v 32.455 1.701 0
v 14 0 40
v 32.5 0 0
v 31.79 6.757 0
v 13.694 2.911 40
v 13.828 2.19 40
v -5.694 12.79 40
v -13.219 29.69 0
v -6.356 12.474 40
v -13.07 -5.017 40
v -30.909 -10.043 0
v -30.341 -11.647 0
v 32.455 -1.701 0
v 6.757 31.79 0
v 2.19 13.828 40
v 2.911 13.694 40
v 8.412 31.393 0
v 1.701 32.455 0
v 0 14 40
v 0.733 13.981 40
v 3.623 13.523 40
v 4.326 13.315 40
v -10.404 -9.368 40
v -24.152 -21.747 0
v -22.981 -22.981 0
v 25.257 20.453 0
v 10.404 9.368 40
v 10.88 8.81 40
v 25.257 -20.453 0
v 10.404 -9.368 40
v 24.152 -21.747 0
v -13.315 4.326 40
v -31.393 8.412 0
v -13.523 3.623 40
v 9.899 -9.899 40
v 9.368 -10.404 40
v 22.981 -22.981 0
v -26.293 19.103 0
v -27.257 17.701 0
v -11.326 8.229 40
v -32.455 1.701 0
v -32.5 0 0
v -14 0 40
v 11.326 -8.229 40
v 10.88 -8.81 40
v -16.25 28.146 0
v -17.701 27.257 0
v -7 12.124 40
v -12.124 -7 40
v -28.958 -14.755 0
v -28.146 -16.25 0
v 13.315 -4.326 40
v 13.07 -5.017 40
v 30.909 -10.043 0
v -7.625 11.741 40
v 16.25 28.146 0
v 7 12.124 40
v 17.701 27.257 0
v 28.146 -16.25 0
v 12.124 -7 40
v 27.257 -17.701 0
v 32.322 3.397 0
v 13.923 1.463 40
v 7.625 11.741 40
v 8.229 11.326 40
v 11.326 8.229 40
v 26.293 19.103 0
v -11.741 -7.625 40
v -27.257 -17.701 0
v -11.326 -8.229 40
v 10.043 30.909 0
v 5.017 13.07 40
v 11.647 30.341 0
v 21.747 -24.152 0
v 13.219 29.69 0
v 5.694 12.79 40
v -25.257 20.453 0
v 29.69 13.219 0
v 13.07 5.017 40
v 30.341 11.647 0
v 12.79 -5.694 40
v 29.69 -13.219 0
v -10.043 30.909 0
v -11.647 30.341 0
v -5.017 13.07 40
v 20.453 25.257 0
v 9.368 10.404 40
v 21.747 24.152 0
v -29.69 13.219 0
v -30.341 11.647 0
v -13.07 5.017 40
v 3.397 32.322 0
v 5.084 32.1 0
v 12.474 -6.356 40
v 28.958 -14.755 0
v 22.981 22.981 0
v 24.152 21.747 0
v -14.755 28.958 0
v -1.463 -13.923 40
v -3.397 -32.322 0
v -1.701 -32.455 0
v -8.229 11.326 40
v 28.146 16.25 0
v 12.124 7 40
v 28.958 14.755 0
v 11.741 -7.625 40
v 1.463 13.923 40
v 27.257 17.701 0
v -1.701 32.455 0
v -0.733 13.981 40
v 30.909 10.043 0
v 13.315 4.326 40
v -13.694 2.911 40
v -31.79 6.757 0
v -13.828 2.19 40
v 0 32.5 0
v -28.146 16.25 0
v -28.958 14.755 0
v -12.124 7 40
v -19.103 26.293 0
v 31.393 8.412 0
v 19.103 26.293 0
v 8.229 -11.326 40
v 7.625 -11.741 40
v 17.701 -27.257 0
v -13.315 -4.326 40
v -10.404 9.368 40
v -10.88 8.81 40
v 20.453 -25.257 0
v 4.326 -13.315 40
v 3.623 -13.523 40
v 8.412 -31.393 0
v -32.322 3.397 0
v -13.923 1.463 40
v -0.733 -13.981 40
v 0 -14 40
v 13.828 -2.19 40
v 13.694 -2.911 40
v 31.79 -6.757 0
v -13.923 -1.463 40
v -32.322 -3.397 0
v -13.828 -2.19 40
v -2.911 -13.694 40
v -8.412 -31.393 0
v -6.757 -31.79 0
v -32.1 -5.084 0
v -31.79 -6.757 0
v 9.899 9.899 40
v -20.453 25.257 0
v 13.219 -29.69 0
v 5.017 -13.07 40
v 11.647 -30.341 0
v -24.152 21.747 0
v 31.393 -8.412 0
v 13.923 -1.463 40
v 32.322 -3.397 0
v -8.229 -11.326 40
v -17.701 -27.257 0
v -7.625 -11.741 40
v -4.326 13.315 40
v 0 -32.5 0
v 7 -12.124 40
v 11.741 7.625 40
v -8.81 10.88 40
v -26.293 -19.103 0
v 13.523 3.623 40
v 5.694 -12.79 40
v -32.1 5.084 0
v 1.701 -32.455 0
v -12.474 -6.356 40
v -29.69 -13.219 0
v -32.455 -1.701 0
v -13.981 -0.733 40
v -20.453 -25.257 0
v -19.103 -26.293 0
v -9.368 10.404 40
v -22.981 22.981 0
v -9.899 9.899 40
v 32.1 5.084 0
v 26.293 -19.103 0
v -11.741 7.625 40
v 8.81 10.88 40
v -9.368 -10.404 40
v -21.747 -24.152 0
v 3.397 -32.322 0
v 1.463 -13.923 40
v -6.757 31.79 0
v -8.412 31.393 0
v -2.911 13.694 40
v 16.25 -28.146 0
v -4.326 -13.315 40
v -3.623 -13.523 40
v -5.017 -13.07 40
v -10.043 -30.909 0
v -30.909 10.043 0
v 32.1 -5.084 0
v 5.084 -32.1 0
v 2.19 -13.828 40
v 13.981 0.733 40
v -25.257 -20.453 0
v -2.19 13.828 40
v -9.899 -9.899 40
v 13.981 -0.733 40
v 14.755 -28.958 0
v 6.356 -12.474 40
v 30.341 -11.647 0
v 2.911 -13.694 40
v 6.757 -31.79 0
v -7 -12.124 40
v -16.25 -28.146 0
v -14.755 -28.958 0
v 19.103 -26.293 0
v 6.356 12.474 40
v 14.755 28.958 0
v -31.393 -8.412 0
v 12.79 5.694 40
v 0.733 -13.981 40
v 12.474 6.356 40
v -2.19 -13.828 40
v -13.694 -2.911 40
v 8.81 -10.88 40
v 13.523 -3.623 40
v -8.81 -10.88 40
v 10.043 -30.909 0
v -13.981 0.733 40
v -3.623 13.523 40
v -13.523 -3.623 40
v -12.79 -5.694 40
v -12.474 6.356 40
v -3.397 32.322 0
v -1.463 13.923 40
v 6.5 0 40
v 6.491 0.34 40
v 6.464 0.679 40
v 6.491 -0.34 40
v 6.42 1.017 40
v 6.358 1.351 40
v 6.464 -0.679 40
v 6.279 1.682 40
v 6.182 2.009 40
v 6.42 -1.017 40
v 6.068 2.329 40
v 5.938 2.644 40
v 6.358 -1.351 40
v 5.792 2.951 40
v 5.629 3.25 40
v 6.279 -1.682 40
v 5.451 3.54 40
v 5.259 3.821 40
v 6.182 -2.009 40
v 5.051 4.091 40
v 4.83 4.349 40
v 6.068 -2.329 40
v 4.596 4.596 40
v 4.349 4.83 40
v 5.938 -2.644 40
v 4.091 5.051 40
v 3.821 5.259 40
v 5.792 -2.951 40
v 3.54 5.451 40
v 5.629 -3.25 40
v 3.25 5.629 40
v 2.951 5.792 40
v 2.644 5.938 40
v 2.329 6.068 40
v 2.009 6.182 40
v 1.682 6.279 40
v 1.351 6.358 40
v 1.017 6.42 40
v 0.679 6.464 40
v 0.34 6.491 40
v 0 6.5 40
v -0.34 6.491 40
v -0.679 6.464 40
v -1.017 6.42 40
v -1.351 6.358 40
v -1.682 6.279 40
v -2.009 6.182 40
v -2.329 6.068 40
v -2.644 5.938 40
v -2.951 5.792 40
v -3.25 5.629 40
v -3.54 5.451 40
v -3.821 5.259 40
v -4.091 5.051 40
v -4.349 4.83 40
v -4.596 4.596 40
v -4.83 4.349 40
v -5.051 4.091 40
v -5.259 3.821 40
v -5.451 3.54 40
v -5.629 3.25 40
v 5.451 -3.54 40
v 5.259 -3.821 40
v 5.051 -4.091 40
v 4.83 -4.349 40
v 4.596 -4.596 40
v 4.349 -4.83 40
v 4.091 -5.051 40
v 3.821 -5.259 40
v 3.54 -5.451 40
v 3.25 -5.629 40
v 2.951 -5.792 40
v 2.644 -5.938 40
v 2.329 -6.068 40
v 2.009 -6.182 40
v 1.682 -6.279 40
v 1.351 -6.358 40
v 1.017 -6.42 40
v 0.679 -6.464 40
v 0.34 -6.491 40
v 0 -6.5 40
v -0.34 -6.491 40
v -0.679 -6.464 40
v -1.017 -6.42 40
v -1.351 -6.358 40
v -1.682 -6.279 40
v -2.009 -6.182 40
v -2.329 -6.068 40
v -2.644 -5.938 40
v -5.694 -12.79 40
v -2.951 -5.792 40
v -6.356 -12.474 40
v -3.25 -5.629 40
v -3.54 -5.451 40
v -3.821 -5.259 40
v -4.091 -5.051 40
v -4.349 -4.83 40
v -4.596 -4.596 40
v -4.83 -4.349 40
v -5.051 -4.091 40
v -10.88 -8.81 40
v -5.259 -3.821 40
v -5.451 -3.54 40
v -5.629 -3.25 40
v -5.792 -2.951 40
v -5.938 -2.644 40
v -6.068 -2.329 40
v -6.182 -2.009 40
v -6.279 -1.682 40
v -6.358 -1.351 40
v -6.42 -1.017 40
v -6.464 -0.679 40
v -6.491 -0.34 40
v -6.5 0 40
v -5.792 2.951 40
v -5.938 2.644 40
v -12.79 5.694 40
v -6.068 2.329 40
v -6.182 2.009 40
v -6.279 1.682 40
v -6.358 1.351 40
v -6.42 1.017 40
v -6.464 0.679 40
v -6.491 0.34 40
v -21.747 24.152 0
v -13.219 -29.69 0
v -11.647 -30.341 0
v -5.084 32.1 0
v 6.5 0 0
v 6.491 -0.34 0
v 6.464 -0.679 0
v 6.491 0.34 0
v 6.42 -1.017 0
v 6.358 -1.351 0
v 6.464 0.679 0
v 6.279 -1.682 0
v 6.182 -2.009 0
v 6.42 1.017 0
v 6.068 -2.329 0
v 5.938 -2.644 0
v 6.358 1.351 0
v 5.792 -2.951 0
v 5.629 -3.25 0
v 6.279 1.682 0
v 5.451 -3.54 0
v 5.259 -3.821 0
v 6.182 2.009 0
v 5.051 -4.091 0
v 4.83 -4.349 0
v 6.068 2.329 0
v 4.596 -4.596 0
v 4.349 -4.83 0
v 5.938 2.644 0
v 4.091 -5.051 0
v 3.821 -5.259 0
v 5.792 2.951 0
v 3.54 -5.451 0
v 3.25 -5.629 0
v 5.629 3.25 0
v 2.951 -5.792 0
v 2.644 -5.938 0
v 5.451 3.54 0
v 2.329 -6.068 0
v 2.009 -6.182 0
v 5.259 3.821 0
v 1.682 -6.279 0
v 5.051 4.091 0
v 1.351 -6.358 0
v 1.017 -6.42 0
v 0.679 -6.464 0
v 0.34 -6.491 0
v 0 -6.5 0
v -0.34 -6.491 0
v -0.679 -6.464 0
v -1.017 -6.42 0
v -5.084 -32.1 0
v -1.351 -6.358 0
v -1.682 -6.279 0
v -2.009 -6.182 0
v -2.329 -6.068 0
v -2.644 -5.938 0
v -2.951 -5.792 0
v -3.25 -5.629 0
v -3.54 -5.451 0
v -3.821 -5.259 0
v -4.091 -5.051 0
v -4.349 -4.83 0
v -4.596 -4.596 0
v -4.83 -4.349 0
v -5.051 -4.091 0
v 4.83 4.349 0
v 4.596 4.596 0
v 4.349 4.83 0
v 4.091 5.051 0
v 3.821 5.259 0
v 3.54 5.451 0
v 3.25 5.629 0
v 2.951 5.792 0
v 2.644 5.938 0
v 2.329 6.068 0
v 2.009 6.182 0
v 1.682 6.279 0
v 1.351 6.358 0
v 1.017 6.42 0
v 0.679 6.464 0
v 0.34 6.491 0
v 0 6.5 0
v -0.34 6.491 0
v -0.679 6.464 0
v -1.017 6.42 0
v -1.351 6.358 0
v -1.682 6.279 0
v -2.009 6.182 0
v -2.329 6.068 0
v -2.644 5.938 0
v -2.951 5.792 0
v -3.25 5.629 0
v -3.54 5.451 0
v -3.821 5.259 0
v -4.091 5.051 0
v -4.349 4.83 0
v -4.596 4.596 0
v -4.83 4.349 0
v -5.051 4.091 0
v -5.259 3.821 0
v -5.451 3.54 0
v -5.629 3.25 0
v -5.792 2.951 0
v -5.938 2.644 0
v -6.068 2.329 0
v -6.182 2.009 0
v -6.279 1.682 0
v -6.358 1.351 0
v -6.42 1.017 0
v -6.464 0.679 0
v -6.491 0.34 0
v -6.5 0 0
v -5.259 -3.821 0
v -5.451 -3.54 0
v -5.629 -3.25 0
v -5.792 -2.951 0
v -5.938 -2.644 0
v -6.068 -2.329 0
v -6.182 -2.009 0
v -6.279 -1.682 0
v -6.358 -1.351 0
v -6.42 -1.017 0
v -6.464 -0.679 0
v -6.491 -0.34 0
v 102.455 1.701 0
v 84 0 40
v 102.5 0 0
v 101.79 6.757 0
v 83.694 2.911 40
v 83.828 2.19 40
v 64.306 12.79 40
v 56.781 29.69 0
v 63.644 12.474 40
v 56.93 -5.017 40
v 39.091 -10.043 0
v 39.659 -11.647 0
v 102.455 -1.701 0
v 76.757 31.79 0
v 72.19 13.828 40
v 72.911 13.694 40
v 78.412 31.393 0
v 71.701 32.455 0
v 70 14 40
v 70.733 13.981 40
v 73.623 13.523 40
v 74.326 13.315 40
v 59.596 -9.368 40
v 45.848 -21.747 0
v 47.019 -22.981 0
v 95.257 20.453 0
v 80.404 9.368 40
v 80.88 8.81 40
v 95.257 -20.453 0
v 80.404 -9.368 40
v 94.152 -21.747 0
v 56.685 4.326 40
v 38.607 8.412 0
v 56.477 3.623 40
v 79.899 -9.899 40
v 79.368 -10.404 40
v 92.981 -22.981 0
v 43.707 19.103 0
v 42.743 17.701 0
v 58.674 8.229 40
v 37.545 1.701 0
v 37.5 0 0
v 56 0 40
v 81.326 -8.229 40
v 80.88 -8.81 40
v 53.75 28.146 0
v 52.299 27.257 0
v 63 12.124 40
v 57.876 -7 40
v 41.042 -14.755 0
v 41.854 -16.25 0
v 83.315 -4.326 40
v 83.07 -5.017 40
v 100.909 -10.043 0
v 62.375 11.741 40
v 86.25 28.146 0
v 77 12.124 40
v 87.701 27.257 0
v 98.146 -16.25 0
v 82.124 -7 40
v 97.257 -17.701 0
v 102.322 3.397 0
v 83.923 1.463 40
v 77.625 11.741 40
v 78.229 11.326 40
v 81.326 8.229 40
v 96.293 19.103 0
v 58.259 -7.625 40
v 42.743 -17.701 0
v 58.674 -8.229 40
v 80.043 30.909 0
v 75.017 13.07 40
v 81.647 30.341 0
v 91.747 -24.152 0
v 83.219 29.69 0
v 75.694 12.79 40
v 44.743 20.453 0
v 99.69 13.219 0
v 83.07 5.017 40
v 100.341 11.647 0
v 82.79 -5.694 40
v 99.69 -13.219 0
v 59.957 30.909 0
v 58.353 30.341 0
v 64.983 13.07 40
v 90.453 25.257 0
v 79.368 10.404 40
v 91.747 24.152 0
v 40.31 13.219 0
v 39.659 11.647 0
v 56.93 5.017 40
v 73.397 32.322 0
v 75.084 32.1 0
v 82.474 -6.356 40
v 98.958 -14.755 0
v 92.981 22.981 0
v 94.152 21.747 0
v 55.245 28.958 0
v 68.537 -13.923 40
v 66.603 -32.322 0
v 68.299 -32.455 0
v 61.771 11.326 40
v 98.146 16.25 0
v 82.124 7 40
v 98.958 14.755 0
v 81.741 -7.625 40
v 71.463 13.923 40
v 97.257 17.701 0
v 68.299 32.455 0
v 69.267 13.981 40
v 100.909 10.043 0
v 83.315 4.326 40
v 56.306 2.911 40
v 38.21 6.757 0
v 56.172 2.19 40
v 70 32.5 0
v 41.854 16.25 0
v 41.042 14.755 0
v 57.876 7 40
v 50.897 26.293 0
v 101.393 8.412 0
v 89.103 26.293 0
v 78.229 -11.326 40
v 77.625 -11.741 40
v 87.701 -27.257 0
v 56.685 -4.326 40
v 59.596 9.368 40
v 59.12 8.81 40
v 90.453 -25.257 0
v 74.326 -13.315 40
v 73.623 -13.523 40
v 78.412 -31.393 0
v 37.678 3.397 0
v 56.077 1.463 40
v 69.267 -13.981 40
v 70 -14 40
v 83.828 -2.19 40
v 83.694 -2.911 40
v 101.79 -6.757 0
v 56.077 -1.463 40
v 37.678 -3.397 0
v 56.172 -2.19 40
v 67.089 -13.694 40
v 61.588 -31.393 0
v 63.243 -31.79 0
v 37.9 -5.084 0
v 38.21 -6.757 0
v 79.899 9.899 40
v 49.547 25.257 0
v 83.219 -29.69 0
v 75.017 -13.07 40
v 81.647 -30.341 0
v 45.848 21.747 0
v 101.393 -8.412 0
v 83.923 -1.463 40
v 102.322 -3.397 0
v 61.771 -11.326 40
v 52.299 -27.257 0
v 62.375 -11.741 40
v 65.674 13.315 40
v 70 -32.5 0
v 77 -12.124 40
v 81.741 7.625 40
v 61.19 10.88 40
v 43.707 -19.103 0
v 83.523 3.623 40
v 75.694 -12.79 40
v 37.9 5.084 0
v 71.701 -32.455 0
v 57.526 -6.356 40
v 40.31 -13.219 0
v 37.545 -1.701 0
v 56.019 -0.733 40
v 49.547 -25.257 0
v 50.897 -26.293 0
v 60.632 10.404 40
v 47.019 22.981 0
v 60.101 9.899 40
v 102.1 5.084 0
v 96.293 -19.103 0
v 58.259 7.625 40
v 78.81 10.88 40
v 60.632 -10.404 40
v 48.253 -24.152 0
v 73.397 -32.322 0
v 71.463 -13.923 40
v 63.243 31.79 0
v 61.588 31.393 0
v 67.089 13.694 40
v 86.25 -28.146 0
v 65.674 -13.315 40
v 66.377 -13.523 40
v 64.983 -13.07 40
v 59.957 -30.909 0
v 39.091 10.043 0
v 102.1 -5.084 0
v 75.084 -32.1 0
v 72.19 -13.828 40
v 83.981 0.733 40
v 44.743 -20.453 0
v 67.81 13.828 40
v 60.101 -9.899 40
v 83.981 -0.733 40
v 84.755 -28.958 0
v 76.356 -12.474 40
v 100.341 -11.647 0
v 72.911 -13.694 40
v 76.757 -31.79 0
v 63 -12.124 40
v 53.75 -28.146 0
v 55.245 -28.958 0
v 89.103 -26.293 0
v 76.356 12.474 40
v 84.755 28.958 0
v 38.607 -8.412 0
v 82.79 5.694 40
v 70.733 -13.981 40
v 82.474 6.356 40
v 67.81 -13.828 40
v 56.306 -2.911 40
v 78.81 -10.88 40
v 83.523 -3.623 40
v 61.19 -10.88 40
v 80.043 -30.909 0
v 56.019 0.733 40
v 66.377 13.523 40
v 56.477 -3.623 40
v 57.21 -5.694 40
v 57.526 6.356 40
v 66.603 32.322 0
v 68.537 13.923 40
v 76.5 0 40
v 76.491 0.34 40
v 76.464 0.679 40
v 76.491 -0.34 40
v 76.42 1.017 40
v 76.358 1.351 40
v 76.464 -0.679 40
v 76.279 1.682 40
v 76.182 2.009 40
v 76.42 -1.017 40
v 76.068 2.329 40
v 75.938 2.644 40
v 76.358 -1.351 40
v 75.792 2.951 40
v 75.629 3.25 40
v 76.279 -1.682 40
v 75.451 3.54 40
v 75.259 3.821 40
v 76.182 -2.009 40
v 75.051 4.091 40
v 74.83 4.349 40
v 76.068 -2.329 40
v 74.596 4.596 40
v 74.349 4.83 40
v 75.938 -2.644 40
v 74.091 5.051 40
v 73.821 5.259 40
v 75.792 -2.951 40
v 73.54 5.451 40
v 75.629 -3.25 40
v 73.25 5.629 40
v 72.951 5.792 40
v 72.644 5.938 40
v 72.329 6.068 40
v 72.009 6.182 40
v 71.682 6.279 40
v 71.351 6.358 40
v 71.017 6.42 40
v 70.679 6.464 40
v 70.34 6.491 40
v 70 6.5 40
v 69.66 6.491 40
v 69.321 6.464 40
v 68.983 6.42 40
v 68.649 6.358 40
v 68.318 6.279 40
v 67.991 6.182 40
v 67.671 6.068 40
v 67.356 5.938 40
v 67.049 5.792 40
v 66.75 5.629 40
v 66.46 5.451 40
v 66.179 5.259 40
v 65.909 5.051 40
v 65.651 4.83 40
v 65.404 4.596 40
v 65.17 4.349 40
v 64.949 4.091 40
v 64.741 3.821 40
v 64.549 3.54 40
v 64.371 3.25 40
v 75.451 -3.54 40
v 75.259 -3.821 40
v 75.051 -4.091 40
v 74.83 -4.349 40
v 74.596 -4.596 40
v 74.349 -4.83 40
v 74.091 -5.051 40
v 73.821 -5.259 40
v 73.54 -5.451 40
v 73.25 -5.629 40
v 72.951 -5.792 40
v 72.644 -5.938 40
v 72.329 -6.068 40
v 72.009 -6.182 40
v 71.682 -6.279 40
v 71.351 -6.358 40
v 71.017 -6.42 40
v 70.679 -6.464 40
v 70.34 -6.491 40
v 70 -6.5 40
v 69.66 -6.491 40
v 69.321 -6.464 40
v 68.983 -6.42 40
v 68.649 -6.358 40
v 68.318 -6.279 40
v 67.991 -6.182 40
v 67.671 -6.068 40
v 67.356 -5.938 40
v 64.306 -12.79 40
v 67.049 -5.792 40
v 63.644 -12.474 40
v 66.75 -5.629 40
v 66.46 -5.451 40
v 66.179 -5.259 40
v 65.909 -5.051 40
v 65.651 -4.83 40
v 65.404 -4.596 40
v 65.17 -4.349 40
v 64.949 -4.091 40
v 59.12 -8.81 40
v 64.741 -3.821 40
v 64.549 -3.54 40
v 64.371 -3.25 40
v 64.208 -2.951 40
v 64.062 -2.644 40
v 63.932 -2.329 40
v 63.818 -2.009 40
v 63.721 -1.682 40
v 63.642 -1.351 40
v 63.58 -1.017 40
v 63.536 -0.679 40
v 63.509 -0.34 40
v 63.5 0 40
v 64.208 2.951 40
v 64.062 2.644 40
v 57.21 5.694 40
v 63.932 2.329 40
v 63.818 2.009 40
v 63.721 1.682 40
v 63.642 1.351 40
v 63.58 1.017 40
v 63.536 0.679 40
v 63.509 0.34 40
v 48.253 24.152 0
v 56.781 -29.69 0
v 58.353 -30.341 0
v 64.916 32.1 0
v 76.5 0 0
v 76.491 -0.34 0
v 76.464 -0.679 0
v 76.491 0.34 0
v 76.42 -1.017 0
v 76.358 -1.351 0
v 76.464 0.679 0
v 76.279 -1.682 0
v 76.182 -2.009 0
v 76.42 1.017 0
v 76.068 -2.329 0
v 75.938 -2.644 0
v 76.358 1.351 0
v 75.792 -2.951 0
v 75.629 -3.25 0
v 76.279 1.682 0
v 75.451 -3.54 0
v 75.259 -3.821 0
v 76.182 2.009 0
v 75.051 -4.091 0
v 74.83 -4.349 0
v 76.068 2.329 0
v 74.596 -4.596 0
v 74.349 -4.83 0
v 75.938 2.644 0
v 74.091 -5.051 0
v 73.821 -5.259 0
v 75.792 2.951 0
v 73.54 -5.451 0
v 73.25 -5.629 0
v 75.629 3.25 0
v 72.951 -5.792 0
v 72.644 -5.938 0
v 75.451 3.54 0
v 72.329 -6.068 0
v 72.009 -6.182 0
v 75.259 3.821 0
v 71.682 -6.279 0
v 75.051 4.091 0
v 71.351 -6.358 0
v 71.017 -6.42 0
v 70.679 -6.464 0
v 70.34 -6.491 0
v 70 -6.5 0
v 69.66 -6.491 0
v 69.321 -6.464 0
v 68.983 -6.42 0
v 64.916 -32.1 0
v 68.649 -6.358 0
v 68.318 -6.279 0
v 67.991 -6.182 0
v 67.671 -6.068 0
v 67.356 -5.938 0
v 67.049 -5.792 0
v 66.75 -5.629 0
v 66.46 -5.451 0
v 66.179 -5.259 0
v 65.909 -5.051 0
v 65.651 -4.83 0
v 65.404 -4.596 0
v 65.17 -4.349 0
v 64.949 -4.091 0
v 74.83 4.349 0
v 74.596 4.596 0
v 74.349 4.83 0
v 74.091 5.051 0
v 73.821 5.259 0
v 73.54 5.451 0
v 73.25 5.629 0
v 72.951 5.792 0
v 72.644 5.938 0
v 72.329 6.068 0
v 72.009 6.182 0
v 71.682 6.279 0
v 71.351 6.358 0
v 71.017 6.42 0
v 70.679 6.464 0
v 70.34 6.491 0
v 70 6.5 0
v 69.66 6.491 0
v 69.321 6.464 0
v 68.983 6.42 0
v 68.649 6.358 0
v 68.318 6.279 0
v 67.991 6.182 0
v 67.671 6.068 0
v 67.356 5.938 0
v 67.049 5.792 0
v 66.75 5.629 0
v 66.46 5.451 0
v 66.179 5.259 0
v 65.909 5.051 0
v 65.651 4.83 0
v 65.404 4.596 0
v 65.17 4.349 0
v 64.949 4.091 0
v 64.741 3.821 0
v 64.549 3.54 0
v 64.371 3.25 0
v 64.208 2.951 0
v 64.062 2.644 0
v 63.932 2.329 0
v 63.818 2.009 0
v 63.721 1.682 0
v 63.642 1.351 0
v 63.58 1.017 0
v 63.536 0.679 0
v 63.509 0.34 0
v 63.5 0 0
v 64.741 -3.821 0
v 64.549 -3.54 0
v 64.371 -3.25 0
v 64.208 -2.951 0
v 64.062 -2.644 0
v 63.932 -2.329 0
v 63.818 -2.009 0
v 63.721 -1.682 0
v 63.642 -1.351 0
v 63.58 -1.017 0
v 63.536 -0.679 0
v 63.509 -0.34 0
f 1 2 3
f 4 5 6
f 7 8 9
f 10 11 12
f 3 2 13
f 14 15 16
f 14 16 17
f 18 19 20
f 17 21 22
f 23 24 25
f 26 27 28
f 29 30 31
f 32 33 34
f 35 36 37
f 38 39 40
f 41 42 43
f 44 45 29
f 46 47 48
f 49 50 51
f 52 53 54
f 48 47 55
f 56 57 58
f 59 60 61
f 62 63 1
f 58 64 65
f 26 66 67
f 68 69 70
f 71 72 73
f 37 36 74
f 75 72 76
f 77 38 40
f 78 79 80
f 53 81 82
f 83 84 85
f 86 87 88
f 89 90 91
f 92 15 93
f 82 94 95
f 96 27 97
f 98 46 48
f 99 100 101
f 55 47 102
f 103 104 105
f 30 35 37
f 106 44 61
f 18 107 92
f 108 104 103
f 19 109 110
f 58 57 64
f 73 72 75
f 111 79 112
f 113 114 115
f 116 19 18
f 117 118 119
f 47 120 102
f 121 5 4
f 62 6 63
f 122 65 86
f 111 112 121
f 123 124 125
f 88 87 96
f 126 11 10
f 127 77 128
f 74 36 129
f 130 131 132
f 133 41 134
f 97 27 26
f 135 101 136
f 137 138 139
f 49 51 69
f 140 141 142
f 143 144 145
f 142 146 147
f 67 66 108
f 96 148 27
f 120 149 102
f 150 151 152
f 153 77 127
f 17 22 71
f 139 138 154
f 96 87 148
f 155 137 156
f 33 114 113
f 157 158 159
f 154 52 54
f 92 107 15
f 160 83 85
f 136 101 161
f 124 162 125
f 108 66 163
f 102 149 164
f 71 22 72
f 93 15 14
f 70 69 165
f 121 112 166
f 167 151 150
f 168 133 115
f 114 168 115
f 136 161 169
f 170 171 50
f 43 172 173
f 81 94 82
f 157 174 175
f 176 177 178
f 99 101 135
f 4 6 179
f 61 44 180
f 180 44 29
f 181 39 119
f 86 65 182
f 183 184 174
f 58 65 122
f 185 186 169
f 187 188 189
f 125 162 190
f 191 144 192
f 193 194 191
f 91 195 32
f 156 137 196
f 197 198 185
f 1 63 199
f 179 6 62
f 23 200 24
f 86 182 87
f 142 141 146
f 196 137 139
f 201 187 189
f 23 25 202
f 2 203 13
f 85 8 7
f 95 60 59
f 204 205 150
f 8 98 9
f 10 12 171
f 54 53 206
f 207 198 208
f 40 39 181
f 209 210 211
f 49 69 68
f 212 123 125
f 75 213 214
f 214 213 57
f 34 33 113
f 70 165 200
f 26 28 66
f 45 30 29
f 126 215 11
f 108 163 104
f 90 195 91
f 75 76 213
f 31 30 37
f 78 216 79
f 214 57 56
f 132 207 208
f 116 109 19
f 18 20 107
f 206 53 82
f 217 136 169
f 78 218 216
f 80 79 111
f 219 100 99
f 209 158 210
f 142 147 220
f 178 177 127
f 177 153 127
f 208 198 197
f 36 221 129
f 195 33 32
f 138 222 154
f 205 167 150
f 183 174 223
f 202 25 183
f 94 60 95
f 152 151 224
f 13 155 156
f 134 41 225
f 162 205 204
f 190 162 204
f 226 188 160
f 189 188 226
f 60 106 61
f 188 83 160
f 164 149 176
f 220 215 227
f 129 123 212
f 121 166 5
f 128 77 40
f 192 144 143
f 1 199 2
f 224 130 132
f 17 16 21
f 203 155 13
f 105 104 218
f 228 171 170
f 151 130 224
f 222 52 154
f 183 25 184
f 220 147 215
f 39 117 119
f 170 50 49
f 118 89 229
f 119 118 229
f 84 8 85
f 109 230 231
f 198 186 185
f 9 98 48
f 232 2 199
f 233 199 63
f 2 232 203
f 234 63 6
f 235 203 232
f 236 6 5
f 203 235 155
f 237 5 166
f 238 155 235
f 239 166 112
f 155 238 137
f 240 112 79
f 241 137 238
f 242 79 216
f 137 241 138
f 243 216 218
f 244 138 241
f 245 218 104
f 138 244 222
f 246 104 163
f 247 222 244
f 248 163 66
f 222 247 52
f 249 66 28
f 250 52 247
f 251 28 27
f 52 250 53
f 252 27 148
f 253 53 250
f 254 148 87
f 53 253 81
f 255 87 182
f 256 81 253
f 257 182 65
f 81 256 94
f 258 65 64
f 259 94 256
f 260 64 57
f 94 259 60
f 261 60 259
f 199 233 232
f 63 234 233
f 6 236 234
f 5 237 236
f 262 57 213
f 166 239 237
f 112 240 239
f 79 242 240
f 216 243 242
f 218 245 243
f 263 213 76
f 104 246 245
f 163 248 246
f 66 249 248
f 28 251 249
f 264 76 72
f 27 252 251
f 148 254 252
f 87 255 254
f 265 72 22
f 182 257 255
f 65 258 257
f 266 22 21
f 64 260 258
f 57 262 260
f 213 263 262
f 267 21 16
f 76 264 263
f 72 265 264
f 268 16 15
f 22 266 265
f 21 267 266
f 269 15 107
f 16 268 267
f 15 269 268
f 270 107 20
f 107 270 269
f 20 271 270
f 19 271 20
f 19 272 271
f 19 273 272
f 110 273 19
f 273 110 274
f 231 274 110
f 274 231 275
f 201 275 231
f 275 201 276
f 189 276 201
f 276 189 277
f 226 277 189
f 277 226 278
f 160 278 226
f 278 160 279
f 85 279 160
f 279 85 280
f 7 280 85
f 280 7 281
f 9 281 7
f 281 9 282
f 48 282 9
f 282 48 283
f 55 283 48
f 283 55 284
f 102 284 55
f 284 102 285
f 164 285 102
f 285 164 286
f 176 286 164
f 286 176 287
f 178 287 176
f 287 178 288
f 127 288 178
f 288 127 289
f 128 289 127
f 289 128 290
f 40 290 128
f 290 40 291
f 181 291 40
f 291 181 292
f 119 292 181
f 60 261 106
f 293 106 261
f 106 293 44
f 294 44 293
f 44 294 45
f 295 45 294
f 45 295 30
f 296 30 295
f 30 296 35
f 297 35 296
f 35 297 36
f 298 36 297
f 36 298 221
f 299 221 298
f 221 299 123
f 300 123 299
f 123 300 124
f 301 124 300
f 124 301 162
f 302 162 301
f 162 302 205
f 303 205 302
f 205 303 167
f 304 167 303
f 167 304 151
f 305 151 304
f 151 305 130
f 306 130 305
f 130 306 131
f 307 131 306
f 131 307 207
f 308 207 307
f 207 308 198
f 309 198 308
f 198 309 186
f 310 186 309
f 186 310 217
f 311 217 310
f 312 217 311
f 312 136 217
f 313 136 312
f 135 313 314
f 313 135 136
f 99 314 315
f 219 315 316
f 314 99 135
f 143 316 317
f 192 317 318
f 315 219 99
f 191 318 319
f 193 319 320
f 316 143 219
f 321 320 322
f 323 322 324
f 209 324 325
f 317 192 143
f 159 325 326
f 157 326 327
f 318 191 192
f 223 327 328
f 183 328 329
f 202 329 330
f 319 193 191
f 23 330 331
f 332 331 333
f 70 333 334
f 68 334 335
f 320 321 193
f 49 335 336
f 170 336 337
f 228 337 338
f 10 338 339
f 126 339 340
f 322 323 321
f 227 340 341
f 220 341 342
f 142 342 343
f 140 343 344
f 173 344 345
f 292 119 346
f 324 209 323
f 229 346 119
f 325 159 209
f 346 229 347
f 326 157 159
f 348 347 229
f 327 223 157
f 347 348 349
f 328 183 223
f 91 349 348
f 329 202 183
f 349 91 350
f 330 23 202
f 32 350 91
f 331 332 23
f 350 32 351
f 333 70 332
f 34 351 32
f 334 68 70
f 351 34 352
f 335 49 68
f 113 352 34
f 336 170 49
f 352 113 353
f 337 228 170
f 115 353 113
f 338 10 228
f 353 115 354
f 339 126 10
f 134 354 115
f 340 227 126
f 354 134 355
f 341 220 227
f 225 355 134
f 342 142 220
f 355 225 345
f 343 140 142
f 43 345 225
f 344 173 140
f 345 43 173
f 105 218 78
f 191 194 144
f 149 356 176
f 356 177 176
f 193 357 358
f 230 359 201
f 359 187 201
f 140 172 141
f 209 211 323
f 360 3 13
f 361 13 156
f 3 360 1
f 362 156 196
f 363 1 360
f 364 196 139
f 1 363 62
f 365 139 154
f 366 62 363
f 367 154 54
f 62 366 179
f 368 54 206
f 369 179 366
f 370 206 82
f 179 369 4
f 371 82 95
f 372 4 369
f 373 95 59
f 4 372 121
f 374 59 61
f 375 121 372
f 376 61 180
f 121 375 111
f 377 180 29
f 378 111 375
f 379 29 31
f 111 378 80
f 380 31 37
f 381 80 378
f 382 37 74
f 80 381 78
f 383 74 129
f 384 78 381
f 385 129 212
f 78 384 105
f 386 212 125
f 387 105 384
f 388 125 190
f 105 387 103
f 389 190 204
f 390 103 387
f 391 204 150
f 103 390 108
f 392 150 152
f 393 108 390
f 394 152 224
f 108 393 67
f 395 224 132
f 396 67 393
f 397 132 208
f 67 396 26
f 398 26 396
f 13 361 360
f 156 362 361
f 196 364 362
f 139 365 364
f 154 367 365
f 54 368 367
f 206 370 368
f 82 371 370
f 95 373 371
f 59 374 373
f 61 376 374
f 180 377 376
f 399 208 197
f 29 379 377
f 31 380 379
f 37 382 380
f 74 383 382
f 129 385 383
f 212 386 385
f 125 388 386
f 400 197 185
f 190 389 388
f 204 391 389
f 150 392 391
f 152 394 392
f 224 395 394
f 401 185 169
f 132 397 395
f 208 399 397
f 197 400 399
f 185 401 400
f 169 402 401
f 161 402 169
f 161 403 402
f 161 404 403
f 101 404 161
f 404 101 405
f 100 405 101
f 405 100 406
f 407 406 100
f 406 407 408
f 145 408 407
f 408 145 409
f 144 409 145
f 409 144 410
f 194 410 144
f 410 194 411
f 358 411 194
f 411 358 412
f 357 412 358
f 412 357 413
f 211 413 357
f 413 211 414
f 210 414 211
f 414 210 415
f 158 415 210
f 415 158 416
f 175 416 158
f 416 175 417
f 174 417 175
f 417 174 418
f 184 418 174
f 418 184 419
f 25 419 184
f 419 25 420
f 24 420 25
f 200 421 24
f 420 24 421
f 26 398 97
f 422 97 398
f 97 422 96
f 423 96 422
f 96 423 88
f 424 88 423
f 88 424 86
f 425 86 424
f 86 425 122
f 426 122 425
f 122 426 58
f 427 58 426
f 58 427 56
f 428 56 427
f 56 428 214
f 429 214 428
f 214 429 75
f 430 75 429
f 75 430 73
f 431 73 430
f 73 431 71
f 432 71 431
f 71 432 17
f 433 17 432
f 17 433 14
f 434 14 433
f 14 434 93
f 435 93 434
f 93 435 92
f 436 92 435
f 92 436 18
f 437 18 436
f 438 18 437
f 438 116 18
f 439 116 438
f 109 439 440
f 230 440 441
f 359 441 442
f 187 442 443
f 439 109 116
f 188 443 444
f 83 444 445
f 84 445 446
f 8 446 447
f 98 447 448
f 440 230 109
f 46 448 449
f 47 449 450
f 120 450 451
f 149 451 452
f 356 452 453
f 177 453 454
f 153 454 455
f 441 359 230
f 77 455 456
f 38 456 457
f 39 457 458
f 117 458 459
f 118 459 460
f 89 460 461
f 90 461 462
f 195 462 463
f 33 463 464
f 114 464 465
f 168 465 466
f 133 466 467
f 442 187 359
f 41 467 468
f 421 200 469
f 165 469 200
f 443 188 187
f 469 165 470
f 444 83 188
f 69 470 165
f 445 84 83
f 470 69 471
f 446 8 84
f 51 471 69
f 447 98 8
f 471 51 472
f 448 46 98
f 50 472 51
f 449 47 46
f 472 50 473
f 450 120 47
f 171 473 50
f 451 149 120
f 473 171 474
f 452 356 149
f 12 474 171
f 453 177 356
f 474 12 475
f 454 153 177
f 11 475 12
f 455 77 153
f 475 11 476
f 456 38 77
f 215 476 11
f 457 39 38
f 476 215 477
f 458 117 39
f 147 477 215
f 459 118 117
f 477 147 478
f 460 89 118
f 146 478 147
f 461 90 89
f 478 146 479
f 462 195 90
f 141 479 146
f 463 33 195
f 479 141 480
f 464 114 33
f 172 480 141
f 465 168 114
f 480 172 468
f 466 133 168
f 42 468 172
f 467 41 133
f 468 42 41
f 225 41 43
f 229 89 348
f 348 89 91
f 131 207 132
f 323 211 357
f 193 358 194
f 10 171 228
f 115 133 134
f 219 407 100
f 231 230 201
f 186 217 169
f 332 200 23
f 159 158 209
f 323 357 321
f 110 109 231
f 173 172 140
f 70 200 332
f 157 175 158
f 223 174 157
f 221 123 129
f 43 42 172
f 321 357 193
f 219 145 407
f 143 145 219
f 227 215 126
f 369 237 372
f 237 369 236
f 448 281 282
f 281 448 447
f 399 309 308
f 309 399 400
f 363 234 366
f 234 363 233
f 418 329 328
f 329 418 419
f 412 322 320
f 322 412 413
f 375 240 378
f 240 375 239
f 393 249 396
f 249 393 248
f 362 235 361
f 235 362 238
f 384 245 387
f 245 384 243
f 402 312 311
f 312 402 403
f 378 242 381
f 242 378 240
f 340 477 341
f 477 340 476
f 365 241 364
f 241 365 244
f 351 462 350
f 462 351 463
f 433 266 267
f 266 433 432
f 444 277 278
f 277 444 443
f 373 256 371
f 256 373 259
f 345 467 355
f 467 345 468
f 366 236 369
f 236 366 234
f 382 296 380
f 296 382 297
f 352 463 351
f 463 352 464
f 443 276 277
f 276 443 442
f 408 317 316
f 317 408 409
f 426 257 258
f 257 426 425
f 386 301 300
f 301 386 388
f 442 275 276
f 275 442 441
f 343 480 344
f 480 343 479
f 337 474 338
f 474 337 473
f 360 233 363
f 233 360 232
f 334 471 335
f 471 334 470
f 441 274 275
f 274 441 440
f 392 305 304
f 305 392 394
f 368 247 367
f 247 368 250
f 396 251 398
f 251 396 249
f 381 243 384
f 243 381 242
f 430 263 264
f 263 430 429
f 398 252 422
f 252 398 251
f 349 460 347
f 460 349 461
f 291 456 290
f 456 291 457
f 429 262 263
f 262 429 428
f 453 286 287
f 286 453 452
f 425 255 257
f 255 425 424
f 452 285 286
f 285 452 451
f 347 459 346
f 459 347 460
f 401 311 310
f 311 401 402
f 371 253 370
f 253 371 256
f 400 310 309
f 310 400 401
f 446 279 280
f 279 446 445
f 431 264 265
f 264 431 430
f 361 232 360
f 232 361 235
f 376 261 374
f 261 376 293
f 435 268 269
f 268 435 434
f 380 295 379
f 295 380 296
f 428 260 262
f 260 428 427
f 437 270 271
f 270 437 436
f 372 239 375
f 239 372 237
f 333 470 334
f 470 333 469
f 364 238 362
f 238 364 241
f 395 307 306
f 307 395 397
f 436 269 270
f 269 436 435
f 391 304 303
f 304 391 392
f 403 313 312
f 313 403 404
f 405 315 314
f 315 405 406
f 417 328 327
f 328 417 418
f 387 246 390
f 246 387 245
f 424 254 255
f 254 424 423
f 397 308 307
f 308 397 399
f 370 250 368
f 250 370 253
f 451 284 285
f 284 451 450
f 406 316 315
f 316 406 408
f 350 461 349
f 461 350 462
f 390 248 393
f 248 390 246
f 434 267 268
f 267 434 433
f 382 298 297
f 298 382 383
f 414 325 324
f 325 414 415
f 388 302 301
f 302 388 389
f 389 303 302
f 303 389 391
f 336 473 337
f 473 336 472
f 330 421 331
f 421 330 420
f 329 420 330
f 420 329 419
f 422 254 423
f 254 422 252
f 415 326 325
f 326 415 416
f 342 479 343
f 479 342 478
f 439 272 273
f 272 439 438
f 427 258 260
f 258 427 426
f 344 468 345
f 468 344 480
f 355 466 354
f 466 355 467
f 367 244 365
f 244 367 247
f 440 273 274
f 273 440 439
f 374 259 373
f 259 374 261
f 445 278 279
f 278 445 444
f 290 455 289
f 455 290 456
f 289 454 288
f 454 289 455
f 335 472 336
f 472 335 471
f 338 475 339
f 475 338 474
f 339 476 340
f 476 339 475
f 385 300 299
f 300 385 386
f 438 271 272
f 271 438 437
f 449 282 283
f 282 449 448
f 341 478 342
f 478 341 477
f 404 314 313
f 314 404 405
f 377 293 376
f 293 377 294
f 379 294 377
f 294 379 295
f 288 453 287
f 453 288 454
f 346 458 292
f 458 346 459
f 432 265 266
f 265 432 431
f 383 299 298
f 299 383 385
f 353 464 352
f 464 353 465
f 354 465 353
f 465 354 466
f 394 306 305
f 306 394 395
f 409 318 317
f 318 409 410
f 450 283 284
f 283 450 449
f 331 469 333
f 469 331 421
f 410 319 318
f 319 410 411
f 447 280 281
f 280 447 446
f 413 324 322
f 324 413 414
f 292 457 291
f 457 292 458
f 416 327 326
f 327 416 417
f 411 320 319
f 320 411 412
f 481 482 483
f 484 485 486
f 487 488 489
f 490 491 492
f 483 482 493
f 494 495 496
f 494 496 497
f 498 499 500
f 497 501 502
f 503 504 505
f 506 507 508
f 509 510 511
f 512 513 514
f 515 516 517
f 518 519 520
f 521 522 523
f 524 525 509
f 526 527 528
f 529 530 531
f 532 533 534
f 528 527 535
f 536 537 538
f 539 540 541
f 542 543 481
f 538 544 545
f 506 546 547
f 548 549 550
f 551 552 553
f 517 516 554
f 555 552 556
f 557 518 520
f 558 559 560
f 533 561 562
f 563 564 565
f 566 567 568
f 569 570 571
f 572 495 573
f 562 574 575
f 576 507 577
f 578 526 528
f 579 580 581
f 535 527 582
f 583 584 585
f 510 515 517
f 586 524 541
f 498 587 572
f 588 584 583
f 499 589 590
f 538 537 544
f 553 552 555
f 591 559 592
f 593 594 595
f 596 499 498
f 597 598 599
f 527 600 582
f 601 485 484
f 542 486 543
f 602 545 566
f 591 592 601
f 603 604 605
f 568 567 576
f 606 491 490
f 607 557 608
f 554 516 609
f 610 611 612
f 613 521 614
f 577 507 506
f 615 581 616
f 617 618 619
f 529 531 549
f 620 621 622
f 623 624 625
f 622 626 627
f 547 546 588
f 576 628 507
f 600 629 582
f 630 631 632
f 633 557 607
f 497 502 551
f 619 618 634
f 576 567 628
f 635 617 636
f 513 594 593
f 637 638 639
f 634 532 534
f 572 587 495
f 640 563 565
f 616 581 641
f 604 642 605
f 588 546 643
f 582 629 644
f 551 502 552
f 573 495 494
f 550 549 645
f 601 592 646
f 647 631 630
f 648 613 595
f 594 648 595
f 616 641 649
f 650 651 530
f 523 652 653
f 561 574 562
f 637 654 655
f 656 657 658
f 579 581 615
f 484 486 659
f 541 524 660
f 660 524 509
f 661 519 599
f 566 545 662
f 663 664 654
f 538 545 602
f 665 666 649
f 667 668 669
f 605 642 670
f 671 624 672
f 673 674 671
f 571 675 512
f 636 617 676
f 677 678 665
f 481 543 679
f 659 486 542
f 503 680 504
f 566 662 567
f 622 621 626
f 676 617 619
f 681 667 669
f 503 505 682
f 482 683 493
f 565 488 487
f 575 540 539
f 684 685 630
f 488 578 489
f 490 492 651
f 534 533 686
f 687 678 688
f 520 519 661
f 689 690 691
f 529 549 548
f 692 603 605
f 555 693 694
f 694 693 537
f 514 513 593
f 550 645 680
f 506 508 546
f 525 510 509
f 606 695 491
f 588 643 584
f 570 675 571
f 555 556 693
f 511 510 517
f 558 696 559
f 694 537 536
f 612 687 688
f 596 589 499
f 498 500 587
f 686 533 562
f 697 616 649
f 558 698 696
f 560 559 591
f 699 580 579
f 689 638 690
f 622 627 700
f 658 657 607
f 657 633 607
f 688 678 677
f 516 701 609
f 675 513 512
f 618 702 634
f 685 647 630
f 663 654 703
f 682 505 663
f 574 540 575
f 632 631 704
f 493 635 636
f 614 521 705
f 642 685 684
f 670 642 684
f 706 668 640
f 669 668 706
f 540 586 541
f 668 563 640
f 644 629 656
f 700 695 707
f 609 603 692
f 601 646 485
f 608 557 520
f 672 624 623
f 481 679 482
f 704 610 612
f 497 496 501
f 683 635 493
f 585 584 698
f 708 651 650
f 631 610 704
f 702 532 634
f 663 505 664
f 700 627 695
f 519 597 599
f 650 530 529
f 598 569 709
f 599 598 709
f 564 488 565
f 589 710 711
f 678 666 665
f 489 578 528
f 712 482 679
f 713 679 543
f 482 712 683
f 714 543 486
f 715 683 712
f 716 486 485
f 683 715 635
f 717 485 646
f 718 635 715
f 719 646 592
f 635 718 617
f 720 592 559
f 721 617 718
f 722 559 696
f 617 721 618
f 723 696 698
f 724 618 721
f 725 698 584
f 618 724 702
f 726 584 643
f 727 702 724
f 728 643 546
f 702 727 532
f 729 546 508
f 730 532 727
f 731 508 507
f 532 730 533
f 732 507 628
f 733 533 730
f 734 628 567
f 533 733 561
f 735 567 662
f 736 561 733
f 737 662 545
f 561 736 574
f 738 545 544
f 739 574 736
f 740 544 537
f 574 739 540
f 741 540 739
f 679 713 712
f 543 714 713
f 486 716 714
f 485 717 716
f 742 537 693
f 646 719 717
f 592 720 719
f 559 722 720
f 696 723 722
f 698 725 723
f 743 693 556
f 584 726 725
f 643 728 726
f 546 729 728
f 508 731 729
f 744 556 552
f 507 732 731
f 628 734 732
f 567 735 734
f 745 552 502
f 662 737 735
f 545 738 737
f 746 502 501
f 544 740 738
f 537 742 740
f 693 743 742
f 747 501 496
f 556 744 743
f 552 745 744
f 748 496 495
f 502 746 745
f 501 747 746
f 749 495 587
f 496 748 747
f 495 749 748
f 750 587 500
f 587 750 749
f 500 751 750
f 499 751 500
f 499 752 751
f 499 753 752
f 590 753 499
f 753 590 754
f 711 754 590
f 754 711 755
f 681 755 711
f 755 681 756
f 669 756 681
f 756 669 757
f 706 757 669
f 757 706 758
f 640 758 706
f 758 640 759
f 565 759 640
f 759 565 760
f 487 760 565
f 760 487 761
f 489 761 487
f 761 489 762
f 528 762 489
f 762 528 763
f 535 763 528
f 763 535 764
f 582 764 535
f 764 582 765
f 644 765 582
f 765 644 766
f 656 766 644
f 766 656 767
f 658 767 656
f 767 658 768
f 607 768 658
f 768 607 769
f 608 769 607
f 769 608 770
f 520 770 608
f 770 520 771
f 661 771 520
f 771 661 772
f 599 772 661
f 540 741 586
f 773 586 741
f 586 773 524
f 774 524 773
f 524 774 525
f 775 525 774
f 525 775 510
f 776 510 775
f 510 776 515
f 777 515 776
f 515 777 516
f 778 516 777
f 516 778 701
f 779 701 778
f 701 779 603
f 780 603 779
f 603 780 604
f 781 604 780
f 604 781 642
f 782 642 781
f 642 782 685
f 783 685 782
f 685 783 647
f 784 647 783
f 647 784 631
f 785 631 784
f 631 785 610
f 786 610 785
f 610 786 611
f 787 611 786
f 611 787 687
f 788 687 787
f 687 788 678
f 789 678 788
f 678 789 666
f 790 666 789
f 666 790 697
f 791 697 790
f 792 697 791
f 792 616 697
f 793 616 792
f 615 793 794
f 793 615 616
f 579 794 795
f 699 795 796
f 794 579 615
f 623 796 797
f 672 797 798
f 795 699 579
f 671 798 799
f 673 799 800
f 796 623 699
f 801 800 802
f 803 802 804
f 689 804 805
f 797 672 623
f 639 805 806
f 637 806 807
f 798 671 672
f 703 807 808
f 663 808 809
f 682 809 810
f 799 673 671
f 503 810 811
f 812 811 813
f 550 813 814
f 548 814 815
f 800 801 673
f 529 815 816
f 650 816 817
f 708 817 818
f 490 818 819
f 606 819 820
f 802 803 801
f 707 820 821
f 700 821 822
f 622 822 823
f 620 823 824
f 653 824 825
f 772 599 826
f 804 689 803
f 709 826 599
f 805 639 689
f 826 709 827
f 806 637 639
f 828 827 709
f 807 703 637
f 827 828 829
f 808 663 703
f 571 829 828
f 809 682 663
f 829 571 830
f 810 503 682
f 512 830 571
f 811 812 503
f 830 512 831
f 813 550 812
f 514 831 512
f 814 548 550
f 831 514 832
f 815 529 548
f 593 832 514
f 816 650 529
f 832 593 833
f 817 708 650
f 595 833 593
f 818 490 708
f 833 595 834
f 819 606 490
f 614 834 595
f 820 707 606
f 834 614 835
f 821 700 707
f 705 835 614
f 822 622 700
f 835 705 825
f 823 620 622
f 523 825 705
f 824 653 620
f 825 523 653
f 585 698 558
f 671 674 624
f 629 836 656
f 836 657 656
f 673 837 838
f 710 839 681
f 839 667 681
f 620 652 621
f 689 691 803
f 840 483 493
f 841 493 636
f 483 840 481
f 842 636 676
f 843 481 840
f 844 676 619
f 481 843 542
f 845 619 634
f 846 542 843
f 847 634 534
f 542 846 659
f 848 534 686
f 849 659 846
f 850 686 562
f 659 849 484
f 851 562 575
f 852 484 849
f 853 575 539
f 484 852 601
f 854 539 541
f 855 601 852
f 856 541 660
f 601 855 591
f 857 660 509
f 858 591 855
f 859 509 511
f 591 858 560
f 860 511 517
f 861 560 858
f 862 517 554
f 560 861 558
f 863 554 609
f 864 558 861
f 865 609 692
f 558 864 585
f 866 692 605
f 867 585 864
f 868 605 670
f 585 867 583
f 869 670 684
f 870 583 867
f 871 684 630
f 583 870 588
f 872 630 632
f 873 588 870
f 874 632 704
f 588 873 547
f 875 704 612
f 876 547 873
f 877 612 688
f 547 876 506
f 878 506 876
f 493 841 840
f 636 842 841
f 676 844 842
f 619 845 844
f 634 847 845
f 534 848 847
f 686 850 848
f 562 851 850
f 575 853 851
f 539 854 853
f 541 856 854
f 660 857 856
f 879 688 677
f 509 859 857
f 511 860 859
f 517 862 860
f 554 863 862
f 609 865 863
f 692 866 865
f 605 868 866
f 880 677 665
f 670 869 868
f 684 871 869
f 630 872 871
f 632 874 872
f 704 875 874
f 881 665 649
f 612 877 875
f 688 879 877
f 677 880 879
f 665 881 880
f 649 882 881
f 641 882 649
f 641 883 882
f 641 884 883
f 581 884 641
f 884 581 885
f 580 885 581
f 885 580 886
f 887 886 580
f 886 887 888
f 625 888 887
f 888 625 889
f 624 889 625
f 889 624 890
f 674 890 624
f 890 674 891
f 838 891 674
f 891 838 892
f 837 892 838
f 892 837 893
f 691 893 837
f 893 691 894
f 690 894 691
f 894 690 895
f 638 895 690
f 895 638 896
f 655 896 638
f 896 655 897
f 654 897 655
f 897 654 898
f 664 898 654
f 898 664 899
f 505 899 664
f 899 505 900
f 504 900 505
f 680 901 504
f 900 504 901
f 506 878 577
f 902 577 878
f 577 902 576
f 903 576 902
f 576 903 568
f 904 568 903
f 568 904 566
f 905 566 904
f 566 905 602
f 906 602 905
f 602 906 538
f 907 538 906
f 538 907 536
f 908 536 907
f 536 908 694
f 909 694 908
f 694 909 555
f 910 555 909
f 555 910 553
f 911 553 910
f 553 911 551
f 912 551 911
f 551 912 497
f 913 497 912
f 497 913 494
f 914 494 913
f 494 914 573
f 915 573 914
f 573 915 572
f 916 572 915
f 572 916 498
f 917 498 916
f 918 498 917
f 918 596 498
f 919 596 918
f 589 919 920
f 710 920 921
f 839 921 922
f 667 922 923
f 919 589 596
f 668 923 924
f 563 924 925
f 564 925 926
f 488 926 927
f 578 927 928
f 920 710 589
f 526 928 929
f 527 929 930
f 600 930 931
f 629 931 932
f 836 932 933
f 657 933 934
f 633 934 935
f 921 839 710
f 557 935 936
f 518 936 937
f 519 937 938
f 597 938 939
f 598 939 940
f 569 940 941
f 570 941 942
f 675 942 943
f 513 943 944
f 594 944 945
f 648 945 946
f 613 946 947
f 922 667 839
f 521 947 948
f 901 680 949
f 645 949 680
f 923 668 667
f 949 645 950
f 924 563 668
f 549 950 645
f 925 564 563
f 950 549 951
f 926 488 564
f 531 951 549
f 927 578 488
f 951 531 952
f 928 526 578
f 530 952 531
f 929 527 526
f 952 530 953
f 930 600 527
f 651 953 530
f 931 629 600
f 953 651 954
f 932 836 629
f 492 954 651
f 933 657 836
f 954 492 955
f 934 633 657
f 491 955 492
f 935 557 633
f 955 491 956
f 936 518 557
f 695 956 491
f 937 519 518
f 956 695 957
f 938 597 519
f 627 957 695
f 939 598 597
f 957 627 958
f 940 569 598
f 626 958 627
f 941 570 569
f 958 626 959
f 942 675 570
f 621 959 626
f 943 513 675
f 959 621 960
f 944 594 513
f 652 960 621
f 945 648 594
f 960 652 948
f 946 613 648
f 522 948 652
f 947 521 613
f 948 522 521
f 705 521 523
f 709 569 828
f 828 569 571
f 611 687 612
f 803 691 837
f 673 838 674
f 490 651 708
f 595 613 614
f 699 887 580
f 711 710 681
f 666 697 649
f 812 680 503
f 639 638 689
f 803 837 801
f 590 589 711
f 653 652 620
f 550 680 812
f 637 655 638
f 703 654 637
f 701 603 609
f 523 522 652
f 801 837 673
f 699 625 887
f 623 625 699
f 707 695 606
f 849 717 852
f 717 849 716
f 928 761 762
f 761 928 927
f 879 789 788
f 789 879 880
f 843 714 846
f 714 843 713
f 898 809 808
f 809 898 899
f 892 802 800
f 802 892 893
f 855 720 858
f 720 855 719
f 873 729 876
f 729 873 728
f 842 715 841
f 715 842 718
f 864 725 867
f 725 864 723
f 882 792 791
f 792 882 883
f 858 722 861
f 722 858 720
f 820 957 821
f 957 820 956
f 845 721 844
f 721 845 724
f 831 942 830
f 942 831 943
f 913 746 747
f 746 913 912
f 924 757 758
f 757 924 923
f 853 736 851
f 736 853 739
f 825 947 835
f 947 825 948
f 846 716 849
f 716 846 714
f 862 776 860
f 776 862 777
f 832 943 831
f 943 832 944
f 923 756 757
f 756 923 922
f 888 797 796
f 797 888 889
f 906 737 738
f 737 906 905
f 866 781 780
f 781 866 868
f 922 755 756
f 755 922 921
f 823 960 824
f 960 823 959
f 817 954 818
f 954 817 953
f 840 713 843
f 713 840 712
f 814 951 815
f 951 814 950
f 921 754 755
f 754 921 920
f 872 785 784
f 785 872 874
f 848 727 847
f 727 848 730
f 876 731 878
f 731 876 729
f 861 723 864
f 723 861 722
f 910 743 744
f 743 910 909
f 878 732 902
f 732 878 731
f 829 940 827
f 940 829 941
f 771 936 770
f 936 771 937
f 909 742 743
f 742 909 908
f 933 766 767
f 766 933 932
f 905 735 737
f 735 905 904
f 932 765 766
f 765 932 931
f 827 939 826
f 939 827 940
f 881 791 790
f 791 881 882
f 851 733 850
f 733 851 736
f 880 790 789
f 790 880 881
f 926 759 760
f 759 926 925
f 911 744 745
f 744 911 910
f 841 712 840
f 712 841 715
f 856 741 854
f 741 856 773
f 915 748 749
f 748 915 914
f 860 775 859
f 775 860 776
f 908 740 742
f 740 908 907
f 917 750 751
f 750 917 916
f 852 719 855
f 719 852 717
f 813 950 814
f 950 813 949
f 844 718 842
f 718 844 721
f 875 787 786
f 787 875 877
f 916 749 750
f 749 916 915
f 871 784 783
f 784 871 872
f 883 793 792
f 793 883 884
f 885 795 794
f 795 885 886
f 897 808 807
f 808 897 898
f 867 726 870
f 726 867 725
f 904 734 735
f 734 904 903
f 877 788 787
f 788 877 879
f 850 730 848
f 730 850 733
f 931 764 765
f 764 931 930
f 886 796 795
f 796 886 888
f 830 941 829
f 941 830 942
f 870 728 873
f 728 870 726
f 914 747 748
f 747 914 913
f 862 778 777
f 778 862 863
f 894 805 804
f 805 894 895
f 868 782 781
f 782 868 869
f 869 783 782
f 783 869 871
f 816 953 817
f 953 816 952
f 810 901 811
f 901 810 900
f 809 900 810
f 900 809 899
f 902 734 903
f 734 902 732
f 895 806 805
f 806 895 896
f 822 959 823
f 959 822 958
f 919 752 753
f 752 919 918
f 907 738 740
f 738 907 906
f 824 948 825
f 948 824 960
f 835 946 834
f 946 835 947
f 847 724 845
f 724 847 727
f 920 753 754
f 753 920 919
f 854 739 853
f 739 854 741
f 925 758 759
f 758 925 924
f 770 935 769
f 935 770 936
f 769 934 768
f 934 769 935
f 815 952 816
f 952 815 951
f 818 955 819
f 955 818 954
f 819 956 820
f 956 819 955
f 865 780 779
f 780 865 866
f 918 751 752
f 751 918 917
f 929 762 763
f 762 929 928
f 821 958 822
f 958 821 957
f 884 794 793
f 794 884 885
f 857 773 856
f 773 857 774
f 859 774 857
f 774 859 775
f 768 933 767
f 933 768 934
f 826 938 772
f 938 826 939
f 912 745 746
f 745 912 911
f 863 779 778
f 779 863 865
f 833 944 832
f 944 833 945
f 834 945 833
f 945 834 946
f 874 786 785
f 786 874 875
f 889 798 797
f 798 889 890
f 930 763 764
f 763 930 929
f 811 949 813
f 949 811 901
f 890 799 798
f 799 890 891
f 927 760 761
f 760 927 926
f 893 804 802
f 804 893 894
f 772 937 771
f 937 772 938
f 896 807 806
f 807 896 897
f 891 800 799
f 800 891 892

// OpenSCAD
d2=65;

module roleholder (d1=28, d2=d2, di=13, h=40)
{
    difference () {
        cylinder (r1=d2/2, r2=d1/2, h=h);
        cylinder (r=di/2, h=3*h, center=true);
    }
}

roleholder ($fa=3, $fs=.05);
translate ([d2+5, 0, 0])
    roleholder ($fa=3, $fs=.05);
